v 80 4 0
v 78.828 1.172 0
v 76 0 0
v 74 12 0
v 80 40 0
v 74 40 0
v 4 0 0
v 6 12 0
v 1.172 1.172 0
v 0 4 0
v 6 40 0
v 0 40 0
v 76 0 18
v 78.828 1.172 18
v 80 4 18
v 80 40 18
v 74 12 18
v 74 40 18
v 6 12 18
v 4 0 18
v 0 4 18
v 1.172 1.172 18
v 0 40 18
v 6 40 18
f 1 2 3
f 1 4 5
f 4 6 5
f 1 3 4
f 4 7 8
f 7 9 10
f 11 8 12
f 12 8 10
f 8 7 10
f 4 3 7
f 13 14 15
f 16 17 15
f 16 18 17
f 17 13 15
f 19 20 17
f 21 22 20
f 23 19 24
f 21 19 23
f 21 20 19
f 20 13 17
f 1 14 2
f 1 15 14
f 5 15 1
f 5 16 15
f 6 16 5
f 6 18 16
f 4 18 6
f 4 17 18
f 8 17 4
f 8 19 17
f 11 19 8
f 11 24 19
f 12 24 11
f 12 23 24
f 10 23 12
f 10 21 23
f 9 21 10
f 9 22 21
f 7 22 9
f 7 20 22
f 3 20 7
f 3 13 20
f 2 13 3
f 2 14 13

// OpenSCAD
$fn = 32;

// ----------------------------------------------------------------------
// Heat sink frame: 80 x 40 mm frame, 6 mm walls
// ----------------------------------------------------------------------

// --- parameters (mm) ---
profile_height = 18;      // extrusion height
profile_points = 12;      // points of the closed outline

profile = [[0, 4], [1.172, 1.172], [4, 0], [76, 0], [78.828, 1.172], [80, 4], [80, 40], [74, 40], [74, 12], [6, 12], [6, 40], [0, 40]];  // single closed polygon, 12 points, counter clockwise

// --- the one profile operation ---
linear_extrude(height = profile_height) polygon(points = profile);
